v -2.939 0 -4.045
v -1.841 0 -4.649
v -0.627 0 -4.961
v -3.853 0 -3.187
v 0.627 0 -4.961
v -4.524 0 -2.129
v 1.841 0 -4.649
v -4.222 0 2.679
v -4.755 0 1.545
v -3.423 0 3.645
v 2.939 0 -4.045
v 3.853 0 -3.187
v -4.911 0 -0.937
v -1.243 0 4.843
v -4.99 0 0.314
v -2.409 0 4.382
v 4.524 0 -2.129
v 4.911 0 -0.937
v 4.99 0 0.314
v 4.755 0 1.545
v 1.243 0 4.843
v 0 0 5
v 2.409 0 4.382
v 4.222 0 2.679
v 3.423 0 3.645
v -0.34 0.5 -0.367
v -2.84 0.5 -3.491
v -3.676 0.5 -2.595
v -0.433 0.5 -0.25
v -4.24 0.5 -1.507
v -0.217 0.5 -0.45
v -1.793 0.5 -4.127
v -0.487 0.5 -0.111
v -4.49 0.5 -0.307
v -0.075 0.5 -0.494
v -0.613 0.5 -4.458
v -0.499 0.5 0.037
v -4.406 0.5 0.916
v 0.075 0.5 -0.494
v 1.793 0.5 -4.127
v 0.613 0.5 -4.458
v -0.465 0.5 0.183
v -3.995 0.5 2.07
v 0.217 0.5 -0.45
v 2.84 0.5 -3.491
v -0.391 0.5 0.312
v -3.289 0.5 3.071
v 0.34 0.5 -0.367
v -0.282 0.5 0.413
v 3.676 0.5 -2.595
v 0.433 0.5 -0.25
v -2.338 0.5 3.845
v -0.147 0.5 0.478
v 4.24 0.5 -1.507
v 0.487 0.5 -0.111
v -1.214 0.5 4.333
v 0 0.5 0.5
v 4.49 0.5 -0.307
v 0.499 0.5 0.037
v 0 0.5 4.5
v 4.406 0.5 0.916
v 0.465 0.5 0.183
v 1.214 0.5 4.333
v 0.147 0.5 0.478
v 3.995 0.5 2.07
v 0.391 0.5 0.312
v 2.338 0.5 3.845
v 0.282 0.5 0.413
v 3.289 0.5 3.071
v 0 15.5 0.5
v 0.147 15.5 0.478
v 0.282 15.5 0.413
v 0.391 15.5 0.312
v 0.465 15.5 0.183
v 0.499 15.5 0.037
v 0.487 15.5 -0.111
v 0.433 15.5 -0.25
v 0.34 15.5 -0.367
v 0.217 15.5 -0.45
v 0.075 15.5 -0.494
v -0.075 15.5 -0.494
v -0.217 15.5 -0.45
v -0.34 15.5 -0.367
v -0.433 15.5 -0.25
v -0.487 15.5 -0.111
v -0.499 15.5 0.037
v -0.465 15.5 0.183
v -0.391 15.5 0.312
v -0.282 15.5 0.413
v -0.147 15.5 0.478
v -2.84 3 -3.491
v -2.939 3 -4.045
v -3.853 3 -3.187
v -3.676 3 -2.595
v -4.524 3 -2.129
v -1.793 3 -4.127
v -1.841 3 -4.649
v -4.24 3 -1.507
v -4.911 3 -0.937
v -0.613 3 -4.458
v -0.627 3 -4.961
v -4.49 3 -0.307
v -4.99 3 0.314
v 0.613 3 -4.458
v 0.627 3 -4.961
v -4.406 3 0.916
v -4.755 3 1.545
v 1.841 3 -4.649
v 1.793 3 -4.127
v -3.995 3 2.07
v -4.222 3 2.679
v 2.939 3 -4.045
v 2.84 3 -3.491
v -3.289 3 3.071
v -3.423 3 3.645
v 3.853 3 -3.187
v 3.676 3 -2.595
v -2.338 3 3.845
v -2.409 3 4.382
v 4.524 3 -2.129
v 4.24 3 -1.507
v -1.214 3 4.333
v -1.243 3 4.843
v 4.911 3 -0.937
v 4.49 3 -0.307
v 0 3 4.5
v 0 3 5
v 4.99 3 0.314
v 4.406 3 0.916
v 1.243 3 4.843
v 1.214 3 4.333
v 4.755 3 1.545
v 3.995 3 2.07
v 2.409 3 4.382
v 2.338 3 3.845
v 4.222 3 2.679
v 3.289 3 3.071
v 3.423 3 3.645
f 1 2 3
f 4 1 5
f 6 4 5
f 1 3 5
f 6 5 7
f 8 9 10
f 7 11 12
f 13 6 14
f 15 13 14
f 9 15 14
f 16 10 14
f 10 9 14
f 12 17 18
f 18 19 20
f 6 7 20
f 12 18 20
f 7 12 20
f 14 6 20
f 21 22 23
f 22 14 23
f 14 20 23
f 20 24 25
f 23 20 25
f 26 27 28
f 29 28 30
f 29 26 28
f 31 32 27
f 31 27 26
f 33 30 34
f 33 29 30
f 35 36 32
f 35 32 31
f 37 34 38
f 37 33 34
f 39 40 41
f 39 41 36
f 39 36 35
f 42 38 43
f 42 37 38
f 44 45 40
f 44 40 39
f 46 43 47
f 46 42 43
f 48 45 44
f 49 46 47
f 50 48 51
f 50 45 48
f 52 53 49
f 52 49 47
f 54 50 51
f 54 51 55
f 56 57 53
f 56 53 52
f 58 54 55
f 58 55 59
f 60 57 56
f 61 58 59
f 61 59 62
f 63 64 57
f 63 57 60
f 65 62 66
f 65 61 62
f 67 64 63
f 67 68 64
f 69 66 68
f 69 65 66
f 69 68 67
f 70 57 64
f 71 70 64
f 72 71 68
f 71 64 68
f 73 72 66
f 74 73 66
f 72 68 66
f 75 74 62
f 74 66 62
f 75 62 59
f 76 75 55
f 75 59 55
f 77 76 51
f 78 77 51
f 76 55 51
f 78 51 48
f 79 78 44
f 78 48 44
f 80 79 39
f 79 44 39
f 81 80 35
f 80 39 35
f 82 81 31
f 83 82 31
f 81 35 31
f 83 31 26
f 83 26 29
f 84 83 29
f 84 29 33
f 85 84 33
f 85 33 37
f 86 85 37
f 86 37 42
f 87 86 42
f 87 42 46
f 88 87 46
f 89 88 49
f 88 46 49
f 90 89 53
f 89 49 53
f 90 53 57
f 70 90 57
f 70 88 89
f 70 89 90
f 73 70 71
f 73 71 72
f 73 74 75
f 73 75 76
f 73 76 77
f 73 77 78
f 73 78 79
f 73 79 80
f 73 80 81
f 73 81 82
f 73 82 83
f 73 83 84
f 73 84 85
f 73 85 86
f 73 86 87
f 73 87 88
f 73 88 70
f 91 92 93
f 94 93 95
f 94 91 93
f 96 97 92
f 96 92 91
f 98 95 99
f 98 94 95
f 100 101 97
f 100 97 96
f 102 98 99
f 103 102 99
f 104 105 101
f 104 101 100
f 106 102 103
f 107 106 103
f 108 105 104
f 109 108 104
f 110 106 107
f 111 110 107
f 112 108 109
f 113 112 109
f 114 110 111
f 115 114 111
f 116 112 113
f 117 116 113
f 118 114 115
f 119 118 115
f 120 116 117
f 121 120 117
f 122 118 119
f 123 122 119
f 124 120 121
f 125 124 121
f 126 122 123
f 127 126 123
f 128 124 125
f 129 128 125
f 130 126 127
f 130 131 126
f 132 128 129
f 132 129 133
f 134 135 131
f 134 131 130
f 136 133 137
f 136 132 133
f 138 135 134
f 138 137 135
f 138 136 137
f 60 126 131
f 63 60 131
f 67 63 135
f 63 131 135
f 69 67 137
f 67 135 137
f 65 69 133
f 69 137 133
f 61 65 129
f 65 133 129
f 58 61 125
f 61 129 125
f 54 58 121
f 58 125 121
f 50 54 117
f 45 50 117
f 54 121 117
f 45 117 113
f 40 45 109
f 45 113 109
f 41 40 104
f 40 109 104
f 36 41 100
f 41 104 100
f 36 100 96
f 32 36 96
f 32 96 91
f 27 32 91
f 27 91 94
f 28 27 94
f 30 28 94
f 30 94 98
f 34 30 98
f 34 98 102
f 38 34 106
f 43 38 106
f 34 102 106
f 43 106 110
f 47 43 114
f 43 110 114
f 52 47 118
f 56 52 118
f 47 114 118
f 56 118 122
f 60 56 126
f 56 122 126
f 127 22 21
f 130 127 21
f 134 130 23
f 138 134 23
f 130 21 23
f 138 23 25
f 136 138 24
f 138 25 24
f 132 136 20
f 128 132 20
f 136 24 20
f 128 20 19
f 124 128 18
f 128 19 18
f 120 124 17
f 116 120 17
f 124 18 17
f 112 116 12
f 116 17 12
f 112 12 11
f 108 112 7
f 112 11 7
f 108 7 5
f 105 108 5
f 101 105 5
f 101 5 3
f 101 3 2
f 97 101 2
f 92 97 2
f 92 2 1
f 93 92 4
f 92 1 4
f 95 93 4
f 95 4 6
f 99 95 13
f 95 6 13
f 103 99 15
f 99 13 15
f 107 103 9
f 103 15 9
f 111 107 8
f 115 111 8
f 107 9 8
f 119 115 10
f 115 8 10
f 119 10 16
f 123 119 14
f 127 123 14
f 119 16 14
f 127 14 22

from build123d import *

# Parameters (mm, degrees)
SKETCH1_R           = 5
BOSS_EXTRUDE1_DEPTH = 3
SKETCH2_R           = 4.5
CUT_EXTRUDE1_DEPTH  = 2.5
SKETCH3_R           = 0.5
BOSS_EXTRUDE2_DEPTH = 15


with BuildPart() as part:
    # Sketch1 → Boss-Extrude1 (new body)
    with BuildSketch(Plane(origin=(0, 0, 0), x_dir=(1, 0, 0), z_dir=(0, 1, 0))):
        with Locations(Location((0, 0, 0), (0, 0, 270))):
            Circle(SKETCH1_R)
    extrude(amount=BOSS_EXTRUDE1_DEPTH)

    # Sketch2 → Cut-Extrude1 (cut)
    with BuildSketch(Plane(origin=(0, 3, 0), x_dir=(1, 0, 0), z_dir=(0, 1, 0))):
        with Locations(Location((0, 0, 0), (0, 0, 270))):
            Circle(SKETCH2_R)
    extrude(amount=-CUT_EXTRUDE1_DEPTH, mode=Mode.SUBTRACT)

    # Sketch3 → Boss-Extrude2 (add)
    with BuildSketch(Plane(origin=(0, 0.5, 0), x_dir=(1, 0, 0), z_dir=(0, 1, 0))):
        with Locations(Location((0, 0, 0), (0, 0, 270))):
            Circle(SKETCH3_R)
    extrude(amount=BOSS_EXTRUDE2_DEPTH)


solid = part.part
